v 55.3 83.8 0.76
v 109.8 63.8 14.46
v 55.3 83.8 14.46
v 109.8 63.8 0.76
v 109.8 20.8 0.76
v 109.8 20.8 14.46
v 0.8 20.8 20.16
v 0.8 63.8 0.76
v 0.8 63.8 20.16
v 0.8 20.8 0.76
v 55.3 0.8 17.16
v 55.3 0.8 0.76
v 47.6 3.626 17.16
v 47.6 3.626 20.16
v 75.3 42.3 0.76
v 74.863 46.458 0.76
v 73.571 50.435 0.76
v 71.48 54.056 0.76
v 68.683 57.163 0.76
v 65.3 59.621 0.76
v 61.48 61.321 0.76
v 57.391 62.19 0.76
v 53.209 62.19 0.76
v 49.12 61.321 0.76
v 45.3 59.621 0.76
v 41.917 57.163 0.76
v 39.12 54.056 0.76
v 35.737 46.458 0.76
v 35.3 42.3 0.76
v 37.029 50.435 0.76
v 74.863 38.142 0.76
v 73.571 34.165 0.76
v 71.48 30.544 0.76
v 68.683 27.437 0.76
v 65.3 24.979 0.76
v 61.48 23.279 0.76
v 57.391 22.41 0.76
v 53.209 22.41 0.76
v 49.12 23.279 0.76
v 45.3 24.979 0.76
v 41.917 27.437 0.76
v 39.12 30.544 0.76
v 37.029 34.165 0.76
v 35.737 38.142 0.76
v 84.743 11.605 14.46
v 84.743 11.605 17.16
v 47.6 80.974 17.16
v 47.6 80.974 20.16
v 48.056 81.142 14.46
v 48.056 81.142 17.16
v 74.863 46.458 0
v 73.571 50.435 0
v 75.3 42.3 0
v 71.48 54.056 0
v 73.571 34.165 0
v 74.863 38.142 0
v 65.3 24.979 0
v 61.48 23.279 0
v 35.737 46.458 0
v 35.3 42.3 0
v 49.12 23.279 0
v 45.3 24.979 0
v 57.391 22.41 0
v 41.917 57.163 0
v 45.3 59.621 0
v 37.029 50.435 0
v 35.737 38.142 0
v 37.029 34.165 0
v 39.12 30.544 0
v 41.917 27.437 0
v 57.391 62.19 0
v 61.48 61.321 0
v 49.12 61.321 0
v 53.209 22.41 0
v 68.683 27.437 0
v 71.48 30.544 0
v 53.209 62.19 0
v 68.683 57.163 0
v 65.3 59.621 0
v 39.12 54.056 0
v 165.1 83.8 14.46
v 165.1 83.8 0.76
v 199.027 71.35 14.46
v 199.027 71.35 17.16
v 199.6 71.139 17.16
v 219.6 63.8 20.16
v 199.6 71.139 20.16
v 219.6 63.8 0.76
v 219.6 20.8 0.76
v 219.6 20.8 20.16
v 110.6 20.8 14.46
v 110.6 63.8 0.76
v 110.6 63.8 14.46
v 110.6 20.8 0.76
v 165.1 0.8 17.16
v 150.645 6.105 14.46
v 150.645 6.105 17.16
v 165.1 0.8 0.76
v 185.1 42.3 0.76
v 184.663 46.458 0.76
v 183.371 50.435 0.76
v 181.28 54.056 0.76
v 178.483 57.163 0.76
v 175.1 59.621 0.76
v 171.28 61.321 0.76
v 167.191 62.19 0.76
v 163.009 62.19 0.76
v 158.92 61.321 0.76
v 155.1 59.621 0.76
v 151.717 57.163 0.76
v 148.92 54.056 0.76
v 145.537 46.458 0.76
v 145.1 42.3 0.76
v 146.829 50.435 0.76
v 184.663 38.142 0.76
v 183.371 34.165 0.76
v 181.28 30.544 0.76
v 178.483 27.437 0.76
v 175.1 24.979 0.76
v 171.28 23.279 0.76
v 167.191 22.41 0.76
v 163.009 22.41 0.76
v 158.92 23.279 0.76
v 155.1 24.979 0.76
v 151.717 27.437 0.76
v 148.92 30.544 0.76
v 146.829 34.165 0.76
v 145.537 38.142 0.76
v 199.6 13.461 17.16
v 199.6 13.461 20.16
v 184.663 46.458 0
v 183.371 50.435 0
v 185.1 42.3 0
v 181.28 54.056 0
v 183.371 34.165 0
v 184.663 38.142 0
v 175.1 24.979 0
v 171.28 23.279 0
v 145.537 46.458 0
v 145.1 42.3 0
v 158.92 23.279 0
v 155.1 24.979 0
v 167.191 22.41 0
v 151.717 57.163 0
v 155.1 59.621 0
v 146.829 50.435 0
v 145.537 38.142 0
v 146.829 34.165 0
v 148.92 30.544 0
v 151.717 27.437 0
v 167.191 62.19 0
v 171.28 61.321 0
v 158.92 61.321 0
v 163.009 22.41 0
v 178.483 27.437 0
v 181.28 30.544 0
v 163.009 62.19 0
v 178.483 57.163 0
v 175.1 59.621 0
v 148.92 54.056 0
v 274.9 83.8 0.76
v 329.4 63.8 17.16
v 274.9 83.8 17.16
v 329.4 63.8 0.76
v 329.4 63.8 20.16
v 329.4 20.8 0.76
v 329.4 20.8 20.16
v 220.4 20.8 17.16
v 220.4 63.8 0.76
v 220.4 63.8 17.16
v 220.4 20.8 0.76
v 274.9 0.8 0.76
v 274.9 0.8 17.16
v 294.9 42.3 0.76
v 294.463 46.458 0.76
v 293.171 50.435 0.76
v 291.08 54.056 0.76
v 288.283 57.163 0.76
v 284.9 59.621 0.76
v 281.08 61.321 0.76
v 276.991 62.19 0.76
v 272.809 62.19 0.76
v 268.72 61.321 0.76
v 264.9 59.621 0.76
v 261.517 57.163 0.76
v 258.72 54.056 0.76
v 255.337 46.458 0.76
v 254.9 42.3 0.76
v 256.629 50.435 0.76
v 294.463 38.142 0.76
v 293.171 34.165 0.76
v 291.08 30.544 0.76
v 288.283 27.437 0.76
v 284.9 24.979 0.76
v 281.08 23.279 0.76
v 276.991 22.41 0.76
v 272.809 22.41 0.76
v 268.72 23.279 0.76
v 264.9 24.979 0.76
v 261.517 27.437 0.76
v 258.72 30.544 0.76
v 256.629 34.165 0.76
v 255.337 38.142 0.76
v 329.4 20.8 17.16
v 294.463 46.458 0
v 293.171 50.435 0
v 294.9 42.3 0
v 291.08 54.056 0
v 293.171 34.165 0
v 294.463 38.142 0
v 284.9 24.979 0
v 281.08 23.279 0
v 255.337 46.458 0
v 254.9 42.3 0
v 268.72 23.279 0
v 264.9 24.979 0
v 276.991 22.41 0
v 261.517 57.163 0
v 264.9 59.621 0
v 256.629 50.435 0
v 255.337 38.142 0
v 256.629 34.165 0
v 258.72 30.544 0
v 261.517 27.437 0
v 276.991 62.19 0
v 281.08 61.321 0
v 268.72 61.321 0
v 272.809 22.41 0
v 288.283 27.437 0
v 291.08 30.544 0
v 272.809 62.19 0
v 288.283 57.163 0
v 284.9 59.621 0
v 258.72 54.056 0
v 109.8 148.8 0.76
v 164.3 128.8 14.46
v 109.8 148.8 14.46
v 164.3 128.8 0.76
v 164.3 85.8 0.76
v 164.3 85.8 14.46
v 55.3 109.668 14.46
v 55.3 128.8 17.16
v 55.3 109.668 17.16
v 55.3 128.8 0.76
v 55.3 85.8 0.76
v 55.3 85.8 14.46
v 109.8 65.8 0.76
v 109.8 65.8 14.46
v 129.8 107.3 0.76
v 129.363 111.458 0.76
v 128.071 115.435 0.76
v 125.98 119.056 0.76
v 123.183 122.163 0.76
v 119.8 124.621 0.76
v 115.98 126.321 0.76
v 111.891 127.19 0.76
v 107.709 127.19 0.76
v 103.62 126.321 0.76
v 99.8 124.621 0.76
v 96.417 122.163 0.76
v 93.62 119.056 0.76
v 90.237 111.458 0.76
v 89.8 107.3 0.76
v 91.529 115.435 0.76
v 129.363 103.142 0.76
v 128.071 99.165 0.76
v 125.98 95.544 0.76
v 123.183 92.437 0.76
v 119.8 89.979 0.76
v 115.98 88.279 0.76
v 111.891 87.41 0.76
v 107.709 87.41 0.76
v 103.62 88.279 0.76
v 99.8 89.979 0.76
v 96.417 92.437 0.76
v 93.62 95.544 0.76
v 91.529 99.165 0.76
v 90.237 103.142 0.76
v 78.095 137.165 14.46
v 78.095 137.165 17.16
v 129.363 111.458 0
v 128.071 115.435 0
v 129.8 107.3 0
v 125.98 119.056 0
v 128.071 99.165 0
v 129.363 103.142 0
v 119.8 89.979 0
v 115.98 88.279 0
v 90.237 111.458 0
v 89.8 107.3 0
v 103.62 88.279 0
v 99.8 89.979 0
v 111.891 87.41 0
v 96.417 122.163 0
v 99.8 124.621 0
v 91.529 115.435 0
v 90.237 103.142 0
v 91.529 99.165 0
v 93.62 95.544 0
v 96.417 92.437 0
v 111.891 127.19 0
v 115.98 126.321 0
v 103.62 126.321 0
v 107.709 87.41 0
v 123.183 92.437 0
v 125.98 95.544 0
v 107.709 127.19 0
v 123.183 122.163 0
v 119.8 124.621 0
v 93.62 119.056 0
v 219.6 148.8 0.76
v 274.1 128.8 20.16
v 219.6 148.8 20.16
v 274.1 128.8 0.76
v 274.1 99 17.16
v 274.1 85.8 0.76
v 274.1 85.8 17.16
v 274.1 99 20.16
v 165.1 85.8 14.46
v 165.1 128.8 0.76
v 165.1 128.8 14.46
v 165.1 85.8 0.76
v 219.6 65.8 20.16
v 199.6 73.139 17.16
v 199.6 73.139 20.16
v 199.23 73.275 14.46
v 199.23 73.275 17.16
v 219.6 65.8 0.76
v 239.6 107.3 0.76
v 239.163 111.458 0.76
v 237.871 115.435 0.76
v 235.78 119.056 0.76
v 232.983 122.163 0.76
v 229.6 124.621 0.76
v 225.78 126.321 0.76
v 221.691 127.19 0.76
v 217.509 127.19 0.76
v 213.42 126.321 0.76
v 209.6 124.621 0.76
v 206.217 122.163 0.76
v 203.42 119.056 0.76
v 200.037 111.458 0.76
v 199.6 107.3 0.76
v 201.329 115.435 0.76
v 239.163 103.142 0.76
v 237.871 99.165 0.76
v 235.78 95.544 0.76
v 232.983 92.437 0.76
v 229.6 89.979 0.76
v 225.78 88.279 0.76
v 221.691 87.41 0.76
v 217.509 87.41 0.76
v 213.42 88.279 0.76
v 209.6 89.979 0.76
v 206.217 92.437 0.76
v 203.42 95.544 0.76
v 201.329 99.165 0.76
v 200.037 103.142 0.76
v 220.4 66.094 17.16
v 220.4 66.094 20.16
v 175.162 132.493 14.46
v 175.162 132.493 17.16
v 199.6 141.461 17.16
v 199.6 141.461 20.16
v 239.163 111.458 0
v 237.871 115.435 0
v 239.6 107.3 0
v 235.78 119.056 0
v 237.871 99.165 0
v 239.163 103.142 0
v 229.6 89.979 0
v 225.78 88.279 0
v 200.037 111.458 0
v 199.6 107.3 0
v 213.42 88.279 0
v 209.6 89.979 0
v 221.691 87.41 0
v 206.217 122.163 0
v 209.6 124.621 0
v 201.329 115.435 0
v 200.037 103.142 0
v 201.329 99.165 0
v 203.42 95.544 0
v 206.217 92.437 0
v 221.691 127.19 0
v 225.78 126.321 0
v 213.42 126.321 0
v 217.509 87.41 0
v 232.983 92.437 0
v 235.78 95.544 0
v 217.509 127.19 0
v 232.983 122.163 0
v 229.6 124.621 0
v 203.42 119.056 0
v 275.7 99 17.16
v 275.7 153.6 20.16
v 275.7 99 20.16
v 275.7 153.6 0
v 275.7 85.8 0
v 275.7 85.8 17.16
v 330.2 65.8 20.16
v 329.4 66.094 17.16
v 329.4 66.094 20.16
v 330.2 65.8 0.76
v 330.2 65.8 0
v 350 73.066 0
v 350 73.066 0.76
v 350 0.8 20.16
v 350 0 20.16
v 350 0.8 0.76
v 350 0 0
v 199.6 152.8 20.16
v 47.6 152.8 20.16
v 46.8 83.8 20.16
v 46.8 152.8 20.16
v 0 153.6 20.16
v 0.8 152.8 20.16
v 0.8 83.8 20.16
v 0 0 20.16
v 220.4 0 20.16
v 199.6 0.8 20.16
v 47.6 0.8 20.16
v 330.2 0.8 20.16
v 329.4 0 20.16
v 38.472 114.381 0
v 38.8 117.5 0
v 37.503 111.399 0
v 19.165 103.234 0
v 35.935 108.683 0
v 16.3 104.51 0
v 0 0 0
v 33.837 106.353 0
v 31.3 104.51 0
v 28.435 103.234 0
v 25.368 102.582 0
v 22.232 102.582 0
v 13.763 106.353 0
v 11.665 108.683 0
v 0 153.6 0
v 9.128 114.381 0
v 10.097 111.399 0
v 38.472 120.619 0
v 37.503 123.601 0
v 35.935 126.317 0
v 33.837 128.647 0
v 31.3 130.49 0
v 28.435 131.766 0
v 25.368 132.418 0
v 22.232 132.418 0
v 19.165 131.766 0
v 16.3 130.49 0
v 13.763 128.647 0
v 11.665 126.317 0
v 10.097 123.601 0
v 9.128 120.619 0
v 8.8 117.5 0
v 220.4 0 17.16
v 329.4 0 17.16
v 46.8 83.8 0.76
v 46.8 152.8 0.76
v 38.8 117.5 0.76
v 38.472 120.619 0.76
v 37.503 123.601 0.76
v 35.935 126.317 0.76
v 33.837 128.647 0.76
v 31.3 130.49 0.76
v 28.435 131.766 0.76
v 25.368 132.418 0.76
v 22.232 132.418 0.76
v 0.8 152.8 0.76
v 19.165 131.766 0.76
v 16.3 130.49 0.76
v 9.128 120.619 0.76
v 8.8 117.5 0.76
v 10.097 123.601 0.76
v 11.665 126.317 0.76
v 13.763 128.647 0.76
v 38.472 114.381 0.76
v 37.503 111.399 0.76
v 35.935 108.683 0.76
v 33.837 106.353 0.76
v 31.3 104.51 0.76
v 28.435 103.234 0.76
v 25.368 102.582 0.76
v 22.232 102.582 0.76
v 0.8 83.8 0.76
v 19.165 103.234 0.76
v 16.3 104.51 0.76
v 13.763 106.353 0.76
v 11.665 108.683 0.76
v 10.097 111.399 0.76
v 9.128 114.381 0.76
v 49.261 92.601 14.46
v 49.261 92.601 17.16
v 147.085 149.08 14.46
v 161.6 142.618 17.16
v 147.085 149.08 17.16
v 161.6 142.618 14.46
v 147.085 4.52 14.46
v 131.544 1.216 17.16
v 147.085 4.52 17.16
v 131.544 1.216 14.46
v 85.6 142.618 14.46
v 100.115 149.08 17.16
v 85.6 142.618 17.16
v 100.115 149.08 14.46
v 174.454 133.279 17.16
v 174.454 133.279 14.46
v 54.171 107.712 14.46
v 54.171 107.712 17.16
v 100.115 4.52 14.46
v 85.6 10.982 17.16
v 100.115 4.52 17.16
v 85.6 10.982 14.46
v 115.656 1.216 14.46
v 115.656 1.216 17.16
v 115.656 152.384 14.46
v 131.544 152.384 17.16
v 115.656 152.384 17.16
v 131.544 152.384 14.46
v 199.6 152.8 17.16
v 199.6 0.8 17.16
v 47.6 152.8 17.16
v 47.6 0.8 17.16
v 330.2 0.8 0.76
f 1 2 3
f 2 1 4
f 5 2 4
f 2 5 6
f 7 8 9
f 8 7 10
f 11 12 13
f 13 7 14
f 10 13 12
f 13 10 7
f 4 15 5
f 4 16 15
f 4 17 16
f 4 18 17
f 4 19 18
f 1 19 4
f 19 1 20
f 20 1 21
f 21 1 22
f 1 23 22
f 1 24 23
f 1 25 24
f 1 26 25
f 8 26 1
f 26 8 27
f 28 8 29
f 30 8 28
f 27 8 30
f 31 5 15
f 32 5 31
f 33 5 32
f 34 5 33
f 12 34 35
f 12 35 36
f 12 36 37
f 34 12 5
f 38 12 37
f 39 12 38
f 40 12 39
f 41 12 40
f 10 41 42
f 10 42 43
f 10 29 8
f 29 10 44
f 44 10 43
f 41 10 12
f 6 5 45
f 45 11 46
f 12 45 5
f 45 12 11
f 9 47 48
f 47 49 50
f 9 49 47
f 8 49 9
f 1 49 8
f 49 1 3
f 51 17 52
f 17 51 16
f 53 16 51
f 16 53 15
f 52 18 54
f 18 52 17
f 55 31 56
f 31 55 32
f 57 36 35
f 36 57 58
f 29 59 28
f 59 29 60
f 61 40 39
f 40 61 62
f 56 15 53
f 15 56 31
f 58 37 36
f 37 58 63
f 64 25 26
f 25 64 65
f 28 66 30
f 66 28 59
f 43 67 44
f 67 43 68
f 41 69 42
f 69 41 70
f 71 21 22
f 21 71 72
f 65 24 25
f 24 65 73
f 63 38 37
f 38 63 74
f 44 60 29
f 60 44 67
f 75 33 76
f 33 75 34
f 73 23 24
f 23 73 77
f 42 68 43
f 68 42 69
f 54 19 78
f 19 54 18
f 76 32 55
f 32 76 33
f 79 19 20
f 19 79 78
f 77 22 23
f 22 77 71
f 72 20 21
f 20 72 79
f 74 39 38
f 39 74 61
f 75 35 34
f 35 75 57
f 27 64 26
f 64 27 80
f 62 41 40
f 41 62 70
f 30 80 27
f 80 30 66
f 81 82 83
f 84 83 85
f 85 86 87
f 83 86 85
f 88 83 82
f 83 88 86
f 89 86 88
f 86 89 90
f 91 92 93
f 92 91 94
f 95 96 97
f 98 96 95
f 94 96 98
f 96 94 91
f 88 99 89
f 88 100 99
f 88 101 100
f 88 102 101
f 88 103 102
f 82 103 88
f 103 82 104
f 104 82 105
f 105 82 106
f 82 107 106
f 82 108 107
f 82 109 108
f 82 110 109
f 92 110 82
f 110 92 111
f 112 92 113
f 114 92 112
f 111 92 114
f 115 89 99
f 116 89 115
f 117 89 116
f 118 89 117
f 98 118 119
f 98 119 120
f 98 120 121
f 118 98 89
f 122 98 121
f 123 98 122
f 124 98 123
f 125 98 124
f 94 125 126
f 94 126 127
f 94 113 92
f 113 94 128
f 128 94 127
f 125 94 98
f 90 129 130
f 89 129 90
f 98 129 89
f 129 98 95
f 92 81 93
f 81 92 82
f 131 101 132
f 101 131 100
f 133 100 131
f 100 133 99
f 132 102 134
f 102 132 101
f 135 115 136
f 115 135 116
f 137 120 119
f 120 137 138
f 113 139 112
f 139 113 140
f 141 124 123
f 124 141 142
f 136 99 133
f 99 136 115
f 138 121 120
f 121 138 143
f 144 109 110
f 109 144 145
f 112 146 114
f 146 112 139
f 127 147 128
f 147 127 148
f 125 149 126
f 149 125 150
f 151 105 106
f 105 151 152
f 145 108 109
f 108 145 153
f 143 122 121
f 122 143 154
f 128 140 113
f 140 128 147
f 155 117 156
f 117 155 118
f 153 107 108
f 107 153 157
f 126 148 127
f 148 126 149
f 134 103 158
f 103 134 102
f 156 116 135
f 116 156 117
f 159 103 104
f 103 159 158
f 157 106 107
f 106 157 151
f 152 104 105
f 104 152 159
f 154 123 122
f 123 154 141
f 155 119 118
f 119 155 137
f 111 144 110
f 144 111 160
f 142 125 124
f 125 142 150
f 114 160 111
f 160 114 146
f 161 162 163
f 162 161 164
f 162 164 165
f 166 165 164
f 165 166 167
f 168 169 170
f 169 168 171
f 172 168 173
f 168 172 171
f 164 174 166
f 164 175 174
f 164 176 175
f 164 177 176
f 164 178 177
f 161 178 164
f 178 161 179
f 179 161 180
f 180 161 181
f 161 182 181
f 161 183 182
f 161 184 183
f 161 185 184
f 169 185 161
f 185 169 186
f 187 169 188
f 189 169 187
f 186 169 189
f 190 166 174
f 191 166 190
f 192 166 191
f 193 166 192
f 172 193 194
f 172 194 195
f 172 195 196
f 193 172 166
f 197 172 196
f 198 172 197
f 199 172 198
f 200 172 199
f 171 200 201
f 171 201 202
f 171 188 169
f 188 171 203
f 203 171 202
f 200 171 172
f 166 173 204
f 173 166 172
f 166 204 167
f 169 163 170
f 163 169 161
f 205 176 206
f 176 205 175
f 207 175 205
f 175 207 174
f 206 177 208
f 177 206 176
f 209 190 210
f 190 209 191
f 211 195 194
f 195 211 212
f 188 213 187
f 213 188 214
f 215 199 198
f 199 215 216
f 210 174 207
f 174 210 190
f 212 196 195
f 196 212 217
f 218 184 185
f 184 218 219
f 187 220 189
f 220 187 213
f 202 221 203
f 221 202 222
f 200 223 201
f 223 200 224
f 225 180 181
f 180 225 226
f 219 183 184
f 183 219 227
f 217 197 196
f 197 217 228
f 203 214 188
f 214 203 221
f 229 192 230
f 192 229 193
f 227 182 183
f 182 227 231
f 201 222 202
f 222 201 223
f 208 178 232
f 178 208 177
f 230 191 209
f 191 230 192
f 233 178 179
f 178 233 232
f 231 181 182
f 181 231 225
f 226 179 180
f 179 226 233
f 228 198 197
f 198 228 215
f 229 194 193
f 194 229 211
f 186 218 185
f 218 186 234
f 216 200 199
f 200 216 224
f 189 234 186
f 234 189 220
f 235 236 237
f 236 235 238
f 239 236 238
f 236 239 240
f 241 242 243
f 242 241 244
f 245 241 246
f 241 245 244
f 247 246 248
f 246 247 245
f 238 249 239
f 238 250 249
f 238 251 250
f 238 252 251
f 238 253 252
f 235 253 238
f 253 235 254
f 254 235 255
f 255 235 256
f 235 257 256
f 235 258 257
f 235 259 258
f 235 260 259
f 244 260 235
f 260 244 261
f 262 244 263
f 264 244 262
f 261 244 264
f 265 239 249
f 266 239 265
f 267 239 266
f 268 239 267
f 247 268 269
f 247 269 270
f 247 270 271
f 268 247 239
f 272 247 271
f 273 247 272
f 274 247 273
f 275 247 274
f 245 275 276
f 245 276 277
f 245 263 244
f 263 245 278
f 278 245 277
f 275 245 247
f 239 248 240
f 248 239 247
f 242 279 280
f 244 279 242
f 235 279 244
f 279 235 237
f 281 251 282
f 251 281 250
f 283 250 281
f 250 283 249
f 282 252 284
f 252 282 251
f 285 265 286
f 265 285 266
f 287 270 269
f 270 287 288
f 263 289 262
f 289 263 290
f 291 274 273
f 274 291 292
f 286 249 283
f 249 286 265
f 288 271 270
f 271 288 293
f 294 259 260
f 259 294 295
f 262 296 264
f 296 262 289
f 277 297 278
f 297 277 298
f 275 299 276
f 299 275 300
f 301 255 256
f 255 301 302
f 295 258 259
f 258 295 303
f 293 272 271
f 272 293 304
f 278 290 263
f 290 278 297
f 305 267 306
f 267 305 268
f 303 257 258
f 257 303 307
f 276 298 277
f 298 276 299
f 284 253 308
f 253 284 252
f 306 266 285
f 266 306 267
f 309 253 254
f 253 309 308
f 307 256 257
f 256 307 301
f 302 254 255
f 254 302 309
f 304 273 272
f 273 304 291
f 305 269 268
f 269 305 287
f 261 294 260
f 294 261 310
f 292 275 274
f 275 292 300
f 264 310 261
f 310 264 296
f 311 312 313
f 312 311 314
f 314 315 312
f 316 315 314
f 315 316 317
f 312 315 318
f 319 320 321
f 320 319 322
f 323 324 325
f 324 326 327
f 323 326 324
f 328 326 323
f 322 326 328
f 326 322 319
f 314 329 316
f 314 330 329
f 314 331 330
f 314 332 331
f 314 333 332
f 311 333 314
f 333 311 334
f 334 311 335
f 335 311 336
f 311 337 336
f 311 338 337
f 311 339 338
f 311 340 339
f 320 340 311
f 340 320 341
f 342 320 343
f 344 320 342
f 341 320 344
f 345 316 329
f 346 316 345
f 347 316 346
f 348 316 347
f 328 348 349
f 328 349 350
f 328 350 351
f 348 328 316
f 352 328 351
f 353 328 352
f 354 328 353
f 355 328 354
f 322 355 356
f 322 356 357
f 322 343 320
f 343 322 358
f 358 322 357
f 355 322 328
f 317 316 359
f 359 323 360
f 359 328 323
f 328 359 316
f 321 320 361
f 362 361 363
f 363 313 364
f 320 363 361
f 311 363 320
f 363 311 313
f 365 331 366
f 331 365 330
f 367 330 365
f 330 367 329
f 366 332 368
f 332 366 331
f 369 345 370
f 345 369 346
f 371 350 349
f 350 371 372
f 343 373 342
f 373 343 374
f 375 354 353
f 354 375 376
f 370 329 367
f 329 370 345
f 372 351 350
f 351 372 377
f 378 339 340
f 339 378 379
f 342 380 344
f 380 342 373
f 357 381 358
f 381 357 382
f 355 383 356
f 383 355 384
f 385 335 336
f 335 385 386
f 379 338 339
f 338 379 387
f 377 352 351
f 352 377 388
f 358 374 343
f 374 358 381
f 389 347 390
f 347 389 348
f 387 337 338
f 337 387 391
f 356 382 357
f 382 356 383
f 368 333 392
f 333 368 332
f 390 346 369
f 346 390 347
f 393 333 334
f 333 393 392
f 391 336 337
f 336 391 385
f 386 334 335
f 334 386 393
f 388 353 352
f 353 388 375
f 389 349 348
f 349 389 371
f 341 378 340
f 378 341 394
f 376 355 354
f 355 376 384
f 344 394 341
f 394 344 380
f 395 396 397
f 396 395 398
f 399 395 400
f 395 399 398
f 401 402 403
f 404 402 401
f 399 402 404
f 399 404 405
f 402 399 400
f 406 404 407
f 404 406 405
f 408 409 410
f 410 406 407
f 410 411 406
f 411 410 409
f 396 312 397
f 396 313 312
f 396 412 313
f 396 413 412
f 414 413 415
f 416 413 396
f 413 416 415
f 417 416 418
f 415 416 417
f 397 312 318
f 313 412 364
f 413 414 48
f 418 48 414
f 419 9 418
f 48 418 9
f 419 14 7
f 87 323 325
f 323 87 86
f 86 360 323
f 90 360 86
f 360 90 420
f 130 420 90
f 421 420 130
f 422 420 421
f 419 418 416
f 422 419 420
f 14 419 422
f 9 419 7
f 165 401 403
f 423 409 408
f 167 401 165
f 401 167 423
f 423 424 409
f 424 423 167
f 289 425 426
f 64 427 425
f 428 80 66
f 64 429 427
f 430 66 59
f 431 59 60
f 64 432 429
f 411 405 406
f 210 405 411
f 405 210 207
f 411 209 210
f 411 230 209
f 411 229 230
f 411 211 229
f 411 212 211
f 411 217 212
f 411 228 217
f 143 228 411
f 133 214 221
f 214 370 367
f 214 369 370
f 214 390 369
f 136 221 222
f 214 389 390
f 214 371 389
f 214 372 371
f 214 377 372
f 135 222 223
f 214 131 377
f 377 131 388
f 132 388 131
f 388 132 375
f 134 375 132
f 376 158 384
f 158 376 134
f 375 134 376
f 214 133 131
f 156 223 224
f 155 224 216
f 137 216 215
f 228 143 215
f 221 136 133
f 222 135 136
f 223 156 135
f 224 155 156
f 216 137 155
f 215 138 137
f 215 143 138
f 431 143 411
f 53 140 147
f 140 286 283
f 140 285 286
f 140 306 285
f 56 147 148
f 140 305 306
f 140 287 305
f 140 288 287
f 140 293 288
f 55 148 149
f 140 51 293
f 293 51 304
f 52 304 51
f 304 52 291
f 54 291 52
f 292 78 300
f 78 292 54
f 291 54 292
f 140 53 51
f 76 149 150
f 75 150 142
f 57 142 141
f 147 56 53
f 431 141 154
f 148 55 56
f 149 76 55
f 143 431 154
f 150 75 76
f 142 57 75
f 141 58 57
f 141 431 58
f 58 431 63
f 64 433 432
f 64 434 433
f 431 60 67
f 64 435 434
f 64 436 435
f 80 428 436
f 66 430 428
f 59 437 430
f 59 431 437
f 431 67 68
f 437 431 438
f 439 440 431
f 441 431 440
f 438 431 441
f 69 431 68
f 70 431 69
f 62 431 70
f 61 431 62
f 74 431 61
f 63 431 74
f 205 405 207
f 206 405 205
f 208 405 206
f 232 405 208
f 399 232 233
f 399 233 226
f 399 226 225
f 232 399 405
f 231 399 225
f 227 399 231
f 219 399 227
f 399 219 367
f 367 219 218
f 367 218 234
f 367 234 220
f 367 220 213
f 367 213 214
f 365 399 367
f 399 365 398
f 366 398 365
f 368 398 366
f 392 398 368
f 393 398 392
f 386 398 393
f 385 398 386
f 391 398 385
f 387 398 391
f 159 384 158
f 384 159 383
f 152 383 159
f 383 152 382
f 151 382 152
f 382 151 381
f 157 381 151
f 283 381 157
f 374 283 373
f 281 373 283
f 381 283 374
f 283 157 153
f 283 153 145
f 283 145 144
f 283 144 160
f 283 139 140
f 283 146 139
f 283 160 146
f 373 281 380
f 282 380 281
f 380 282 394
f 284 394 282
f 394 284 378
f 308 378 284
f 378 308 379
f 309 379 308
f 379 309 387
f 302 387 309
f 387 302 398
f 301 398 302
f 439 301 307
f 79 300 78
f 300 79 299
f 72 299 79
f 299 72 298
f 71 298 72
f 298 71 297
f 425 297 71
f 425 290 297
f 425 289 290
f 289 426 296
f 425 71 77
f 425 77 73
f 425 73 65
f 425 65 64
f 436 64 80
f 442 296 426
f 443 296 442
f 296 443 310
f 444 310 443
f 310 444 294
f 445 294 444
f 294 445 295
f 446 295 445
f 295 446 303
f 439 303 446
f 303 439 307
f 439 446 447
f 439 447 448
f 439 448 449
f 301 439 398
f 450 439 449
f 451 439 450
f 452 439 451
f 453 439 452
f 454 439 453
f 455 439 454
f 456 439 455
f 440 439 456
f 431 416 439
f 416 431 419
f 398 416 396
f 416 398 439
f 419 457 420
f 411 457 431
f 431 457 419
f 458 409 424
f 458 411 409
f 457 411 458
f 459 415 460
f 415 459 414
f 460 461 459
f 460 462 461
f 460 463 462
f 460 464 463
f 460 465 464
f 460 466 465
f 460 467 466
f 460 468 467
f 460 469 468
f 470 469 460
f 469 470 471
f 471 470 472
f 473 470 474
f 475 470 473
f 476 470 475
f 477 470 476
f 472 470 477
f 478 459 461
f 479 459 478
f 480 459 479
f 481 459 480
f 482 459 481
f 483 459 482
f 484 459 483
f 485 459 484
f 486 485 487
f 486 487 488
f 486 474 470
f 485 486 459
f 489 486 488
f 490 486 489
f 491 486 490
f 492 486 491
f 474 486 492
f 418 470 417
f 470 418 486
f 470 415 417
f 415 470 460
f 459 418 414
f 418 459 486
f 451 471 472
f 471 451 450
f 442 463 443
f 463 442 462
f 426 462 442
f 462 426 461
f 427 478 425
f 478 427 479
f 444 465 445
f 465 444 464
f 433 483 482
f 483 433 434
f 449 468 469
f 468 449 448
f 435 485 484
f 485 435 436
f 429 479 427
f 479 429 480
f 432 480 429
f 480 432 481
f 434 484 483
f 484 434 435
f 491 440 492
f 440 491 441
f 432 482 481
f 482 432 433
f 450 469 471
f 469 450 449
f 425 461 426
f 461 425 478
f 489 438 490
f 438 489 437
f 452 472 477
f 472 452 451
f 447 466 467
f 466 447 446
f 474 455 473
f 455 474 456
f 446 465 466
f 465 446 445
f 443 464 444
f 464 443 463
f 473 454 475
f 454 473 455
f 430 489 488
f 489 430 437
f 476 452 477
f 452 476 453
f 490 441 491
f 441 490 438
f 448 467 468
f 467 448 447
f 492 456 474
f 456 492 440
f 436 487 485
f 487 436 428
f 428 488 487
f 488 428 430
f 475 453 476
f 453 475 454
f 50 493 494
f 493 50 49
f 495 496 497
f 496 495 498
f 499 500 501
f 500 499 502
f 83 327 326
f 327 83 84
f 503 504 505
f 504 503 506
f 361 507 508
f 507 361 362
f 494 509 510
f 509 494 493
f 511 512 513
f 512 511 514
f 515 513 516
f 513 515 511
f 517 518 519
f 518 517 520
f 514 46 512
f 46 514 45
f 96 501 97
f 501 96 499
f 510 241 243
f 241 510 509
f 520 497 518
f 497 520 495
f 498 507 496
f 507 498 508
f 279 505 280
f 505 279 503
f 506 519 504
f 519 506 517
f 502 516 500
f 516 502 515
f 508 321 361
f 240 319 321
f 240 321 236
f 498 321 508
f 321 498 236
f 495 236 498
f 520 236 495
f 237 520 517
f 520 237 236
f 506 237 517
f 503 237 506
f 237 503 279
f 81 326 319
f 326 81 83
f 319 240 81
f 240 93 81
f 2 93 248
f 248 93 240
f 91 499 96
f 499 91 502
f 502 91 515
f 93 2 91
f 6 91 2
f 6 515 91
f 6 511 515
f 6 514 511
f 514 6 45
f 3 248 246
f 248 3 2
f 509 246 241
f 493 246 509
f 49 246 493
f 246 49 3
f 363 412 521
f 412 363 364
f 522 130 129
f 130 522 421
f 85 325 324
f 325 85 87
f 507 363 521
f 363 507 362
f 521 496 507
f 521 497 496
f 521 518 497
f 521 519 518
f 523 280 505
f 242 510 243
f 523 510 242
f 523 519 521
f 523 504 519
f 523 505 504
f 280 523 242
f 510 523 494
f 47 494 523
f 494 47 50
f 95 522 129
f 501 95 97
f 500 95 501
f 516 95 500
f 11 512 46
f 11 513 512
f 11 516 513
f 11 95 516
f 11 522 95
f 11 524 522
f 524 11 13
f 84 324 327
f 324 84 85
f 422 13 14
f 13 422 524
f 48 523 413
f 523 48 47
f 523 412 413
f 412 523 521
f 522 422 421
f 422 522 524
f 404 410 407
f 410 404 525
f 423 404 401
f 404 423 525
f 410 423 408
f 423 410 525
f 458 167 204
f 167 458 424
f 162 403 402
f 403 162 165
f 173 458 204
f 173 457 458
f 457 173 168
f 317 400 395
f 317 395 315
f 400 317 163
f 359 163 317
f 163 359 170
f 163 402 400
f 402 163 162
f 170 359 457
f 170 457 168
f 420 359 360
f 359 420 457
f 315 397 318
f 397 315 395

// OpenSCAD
// Andromeda's Edge
// Extra Draft, first layer 0.2, others 0.28

wall = 0.8;
flr = 0.2 + 0.28*2;


module playerTray() {
    w = wall*3 + 87 + 43;
    h = wall*4 + 34 + 8.4 + 13;
    m = 4;
    difference() {
        cube([w,h,19.4+flr]);
        translate([wall,wall,flr]) cube([87,34,99]);
        translate([wall,wall*2+34,flr]) cube([74,8.4,99]);
        translate([wall,wall*3+34+8.4,6]) cube([74,13,99]);
        translate([wall*2+87,wall,flr+1]) cube([43,h-wall*2,99]);
        translate([wall,wall,10]) cube([74,h-wall*2,99]);
        translate([wall+72+wall,,wall+34+wall,10]) cube([30,8.4+13+wall,99]);
        //translate([75.6,46.6,8.4+flr]) rotate([0,90,0]) cylinder(h=12,d=17,$fn=60);
        translate([w - wall - m - 18/2,wall + 18/2,flr]) cylinder(h=99,d=16);
        translate([w - wall - m - 18/2,wall + 18*1.5,flr]) cylinder(h=99,d=16);
        translate([w - wall - m -18/2,wall + 18*2.5,flr]) cylinder(h=99,d=16);
        translate([w - wall - m - 18 * 1.5,wall + 18/2,flr]) cylinder(h=99,d=16);
        translate([w - wall - m - 18 * 1.5,wall + 18*1.5,flr]) cylinder(h=99,d=16);
        translate([w - wall - m - 18 * 1.5,wall + 18*2.5,flr]) cylinder(h=99,d=16);
    }
}

//playerTray();

module resourceTray() {
    wells = 5;
    h = 37 - wall*2;
    difference() {
        cube([296,h + wall*2,28.4]);
        translate([wall,wall,flr]) cube([55,h,99]);
        translate([wall+55+wall,wall,flr]) cube([45,h,99]);
        translate([wall+55+wall+45+wall,wall,flr]) cube([45,h,99]);
        translate([wall+55+wall+45+wall+45+wall,wall,flr]) cube([55,h,99]);
        translate([wall+55+wall+45+wall+45+wall+55+wall,wall,flr]) cube([25,h,99]);
        translate([wall+55+wall+45+wall+45+wall+55+wall+25+wall,wall,flr]) 
            cube([296-wall*7-55-45-45-55-25,h,99]);
    }
}

// rotate([0,0,45]) resourceTray();

module cubei(vec) {
    cube(vec);
    translate([10,10,-1]) cube([vec.x-20,vec.y-20,2]);
}
    
module punchoutTray() {
    w = 46 * 4 + wall * 5;
    h = wall*3 + 61 + 57;// + 46;
    

    difference() {
        translate([0,46+wall,0]) cube([w,h,flr+12]);
        // cards
        /* for (i=[0:3]) {
            translate([wall+(46+wall)*i,wall,flr]) cubei([46,46,99]);
        } */
        translate([wall,46+wall*2,flr]) {
            cubei([36,71,99]);
            translate([0,71+wall,0]) cube([36,47,99]);
        }
        translate([wall+36+wall,46+wall*2,flr]) {
            cubei([48,39,99]);
            translate([0,39+wall,0]) cubei([48,71-wall-39,99]);
            translate([0,71+wall,0]) cube([48,47,99]);
        }
        translate([wall,wall+46+wall,flr+8.1]) cube([36+wall+48,71,99]);
                    
        translate([wall+36+wall+48+wall,46+wall*2,flr]) {
            cubei([51,57,99]);
            translate([0,57+wall,0]) cube([51,61,99]);
        }
        translate([wall+36+wall+48+wall+51+wall,46+wall*2,flr]) {
            cubei([49,57,99]);
            translate([0,57+wall,0]) cube([49,61,99]);
        }
        translate([wall+36+wall+48+wall+10,46+wall*2+15,flr+8.1])
            cube([51+wall+49-20,80,99]);
    }
}

// punchoutTray();

module squareCardTray() {
    w = 46 * 4 + wall * 5;
    h = wall*2 + 46;
    difference() {
        cube([w,h,flr+12]);
        for (i=[0:3]) {
            translate([wall+(wall+46)*i,wall,flr]) {
                cube([46,46,99]);
                translate([46/2,-20,12]) rotate([-90,0,0]) cylinder(h=99,d=24);
            }
        }
    }
}

//squareCardTray();

module factionTray() {
    w = 46 * 4 + wall * 5;
    h = 80; // 70 + wall*2;
    difference() {
        cube([w,h,flr+12]);
        translate([(w - 183) / 2, (81-71)/2, flr]) cubei([183,71,99]);
    }
}

//factionTray();

module hexTray(which) {
    module hex() {
        linear_extrude(99) polygon([
            [0,20], [0,83-20], [109/2,83], [109,83-20], [109,20], [109/2,0]]);
        translate([109/2,83/2,-1]) cylinder(h=2,d=40);
    }
    leftWidth = wall*3+109*2;
    rightWidth = 350 - leftWidth; // wall+109;
    difference() {
        translate([which==2?leftWidth+0.01:0,0,0])
            cube([which==1?leftWidth:which==2?rightWidth:leftWidth+rightWidth,
            152+wall+wall,19.4+flr]);

        // card well and finger hole
        translate([wall,wall+152-69,flr]) cube([46,69,99]);
        translate([wall+46/2,83+69/2,-1]) cylinder(h=2,d=30);

        // hexes - bottom row
        translate([wall,wall,flr]) hex();
        translate([wall+109+wall,wall,flr]) hex();
        translate([wall+109+wall+109+wall,wall,flr]) hex();
        
        // hexes - top row
        translate([wall+109/2,wall+65,flr]) hex();
        translate([wall+109/2+wall+109,wall+65,flr]) hex();
        
        // large circle and scrapyard
        translate([wall+46+wall+152/2,wall+152/2,flr+13.7]) cylinder(h=99,d=152);
        translate([wall+46+wall,wall,flr+13.7+2.7]) cube([152,152,99]);
        
        // rightmost cutouts
        translate([wall+109/2+wall+109+wall+109+wall,wall+65,-1]) {
            hex();
            translate([0,40,0]) hex();
        }
        translate([leftWidth+wall+109,wall,flr]) cube([99,200,99]);
        translate([leftWidth,0,flr+13.7+2.7]) cube([109,99,99]);
    }
}

hexTray(3);

module tileAndCards() {
    difference() {
        cube([53+wall+wall,wall+40.4+wall+40.4+wall+45.4+wall,46]);
            translate([wall,wall,flr]) cube([30,45.4,99]);
            translate([wall+30+wall,wall,flr]) cube([13,45.4,99]);
            translate([wall+30+wall+13+wall,wall,flr]) cube([10-wall-wall,45.4,99]);
        translate([wall,wall+45.4+wall,flr]) cube([53,40.4,99]);
        translate([wall,wall+45.4+wall+40.4+wall,flr]) cube([53,40.4,99]);
    }
} 

//tileAndCards();

module cardTray() {
    w = 108-wall-91-wall-wall;
    echo(w);
    difference() {
        cube([108,65*2+wall*3,flr+12]);
        translate([wall,wall,flr]) cubei([91,65,99]);
        translate([wall,wall+65+wall,flr]) cubei([91,65,99]);
        translate([wall+91+wall,wall,flr]) {
            cube([w,74,99]);
            translate([0,74+wall,0]) cube([w,65*2-74,99]);
        }
    }
}

//cardTray();

module miscTray() {
    module octagon(x,y) {
        translate([x * 23,y * 23,flr]) rotate([0,0,45/2]) {
            cylinder(h=99,d=25,$fn=8);
            translate([0,0,-2]) cylinder(h=2,d=16,$fn=8);
        }
    }
    module moon(x,y) {
        translate([2+x * 17.6, y * 18.3,flr]) {
            cylinder(h=99,d=18,$fn=30);
            translate([0,0,-2]) cylinder(h=2,d=12,$fn=30);
        }
    }
    difference() {
        w = 108;
        h = 116;
        cube([w,h,flr+12]);
        for (i=[0:4]) {
            octagon(0.5,0.5+i);
            octagon(1.5,0.5+i);
        }
        v=1.4; u = 1.76;
        for (i=[0:3]) {
            moon(3.0,0.5+i*u);
            if (i!=3) moon(3.5,v+i*u);
            moon(4.0,0.5+i*u);
            if (i!=3) moon(4.5,v+i*u);
            moon(5.0,0.5+i*u);
            if (i!=3) moon(5.5,v+i*u);
        }
    }
}

//miscTray();
